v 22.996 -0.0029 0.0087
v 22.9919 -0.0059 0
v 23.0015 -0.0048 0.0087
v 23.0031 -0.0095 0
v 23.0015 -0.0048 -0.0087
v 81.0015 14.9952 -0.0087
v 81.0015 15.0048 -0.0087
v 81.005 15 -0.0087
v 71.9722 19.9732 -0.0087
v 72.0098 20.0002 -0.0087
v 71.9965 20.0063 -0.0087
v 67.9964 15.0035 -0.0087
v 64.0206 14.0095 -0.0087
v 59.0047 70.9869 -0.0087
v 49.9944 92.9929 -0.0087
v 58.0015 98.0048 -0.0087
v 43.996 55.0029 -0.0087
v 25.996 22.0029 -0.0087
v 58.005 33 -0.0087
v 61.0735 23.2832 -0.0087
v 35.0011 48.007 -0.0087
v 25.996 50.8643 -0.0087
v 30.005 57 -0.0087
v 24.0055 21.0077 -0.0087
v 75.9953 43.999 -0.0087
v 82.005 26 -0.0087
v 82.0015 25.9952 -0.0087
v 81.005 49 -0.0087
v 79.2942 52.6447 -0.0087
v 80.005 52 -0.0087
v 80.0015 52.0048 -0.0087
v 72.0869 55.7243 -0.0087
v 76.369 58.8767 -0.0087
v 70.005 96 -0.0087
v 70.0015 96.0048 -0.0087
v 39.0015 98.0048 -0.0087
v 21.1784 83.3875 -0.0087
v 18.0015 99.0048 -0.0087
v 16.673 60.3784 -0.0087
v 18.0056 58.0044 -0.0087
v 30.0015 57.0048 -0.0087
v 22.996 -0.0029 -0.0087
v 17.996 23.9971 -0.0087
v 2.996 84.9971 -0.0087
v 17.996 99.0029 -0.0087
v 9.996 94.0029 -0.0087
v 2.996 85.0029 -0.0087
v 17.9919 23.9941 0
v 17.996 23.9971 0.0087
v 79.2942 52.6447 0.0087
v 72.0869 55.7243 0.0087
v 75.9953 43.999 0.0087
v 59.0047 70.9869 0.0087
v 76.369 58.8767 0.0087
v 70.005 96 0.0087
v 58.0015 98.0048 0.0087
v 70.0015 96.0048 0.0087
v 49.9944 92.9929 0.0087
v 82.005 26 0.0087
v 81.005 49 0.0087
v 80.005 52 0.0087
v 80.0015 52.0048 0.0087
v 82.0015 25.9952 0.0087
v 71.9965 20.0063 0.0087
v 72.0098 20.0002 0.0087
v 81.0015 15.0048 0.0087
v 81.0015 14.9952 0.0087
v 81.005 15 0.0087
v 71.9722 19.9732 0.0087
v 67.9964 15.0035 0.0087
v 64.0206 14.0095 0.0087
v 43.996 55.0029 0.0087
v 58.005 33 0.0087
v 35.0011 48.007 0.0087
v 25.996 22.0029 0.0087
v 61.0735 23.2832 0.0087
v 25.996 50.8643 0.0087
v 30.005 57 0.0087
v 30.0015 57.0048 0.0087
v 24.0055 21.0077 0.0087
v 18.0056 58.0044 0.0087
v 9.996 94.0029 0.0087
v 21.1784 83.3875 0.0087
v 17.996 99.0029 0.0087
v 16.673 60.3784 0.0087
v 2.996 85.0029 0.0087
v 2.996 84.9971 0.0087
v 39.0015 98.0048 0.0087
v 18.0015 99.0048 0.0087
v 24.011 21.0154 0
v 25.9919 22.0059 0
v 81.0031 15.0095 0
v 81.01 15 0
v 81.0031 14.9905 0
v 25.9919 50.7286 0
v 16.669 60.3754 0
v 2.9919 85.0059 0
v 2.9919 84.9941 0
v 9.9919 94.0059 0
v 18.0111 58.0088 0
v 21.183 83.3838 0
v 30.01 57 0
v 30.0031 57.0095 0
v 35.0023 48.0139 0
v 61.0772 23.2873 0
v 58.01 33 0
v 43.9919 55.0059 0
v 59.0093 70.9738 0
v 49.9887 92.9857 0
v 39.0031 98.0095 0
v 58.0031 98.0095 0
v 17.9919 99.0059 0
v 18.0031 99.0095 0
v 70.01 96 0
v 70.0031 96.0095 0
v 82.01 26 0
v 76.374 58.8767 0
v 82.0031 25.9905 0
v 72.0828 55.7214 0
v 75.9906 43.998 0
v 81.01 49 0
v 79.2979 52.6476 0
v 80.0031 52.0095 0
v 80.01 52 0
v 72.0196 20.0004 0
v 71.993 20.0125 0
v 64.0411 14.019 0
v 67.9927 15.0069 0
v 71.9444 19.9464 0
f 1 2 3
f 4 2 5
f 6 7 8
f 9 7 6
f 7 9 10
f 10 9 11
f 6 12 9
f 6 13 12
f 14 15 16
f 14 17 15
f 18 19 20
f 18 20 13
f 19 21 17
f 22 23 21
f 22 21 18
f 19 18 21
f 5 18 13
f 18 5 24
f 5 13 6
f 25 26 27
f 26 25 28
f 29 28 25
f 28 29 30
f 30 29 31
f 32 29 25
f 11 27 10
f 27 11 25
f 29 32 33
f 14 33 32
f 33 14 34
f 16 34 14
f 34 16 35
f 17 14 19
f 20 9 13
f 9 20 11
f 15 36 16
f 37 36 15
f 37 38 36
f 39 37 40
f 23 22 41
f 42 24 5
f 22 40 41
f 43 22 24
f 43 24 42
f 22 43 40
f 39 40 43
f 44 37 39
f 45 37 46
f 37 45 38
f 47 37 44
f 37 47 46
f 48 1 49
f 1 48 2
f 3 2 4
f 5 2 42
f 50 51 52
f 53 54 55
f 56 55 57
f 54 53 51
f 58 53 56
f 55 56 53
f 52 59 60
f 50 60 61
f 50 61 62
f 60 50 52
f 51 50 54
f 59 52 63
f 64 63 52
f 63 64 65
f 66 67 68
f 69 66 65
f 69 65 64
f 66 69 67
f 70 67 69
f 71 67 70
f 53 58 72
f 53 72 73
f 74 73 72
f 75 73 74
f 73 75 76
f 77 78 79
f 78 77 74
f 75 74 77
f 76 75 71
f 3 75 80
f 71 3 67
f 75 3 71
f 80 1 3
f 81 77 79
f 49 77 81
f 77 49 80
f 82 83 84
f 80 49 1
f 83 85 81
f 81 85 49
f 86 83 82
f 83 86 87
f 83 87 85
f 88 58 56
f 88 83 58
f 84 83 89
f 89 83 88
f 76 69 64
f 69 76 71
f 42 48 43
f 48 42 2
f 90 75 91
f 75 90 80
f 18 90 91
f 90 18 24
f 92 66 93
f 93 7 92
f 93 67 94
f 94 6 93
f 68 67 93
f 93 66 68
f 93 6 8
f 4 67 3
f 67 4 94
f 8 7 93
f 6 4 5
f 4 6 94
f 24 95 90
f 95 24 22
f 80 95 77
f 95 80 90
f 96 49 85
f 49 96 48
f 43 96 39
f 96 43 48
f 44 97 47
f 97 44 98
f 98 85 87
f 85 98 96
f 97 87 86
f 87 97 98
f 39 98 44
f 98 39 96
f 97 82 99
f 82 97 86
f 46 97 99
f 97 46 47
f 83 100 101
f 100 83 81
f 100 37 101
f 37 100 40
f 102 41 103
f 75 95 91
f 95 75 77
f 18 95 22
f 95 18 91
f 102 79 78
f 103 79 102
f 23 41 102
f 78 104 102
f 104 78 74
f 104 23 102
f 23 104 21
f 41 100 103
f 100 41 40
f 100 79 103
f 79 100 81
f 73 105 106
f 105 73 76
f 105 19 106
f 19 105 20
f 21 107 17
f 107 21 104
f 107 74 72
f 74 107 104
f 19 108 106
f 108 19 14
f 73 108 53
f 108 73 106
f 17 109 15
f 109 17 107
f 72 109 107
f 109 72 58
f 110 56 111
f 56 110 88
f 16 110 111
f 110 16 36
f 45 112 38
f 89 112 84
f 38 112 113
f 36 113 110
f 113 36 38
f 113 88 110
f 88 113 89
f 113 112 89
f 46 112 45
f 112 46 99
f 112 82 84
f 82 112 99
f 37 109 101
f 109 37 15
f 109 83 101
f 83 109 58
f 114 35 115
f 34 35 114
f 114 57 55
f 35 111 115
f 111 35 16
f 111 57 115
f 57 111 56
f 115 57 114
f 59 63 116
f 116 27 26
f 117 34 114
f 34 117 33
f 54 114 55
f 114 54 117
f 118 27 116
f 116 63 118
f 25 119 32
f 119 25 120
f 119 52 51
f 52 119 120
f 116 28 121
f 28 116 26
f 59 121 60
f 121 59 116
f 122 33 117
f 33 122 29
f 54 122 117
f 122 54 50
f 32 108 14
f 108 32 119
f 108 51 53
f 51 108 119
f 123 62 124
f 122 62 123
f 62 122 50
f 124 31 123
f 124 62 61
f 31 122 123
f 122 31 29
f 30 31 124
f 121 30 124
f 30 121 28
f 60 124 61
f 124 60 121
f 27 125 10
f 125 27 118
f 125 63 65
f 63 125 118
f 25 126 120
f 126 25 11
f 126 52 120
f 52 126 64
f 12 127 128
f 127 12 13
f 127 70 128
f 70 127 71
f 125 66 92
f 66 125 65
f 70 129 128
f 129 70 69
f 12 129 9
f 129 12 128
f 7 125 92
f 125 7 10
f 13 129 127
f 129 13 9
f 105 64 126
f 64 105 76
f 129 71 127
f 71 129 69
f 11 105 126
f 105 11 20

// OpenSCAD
color([0.5839405385485582,0.4048698908705002,0.6877557316706271]) hull(){
    translate([23,0]) sphere(0.01);
    translate([18,24]) sphere(0.01);
    translate([24,21]) sphere(0.01);
}
color([0.29310936231965135,0.08456113000314536,0.6409271470126323]) hull(){
    translate([23,0]) sphere(0.01);
    translate([24,21]) sphere(0.01);
    translate([26,22]) sphere(0.01);
}
color([0.38512246522478266,0.6162859510128613,0.407224705538046]) hull(){
    translate([23,0]) sphere(0.01);
    translate([26,22]) sphere(0.01);
    translate([42,29]) sphere(0.01);
}
color([0.6107800780239486,0.9541913078580654,0.09369719926319908]) hull(){
    translate([23,0]) sphere(0.01);
    translate([42,29]) sphere(0.01);
    translate([64,14]) sphere(0.01);
}
color([0.4396226851829427,0.9817497074141792,0.30111933510979894]) hull(){
    translate([23,0]) sphere(0.01);
    translate([64,14]) sphere(0.01);
    translate([81,15]) sphere(0.01);
}
color([0.08571041628526821,0.691130580335744,0.16573157374072334]) hull(){
    translate([18,24]) sphere(0.01);
    translate([18,58]) sphere(0.01);
    translate([24,21]) sphere(0.01);
}
color([0.4668304924867862,0.30100213617539295,0.3511677492745029]) hull(){
    translate([18,58]) sphere(0.01);
    translate([26,51]) sphere(0.01);
    translate([24,21]) sphere(0.01);
}
color([0.05564944269037686,0.7696481469448815,0.686275624239137]) hull(){
    translate([18,58]) sphere(0.01);
    translate([18,24]) sphere(0.01);
    translate([16,79]) sphere(0.01);
}
color([0.15447252119296884,0.35335085758162643,0.18799175914388588]) hull(){
    translate([18,58]) sphere(0.01);
    translate([16,79]) sphere(0.01);
    translate([6,84]) sphere(0.01);
}
color([0.41322879780265653,0.82270842281296,0.9057146612667819]) hull(){
    translate([18,58]) sphere(0.01);
    translate([6,84]) sphere(0.01);
    translate([3,85]) sphere(0.01);
}
color([0.9688547633127277,0.5528378273263655,0.12760284187612392]) hull(){
    translate([18,58]) sphere(0.01);
    translate([3,85]) sphere(0.01);
    translate([10,94]) sphere(0.01);
}
color([0.1710979555253146,0.7131998843266452,0.6397779425125977]) hull(){
    translate([18,58]) sphere(0.01);
    translate([10,94]) sphere(0.01);
    translate([22,90]) sphere(0.01);
}
color([0.57496968906483,0.8489371230716904,0.07944838941339594]) hull(){
    translate([18,58]) sphere(0.01);
    translate([22,90]) sphere(0.01);
    translate([20,83]) sphere(0.01);
}
color([0.040333123224873146,0.9305910632054132,0.3080440975445232]) hull(){
    translate([18,58]) sphere(0.01);
    translate([20,83]) sphere(0.01);
    translate([16,79]) sphere(0.01);
}
color([0.6084655882345898,0.4923441190446234,0.7069385087242315]) hull(){
    translate([26,22]) sphere(0.01);
    translate([26,51]) sphere(0.01);
    translate([30,57]) sphere(0.01);
}
color([0.6803385961846494,0.18024793645131376,0.10787678186317007]) hull(){
    translate([26,22]) sphere(0.01);
    translate([30,57]) sphere(0.01);
    translate([35,48]) sphere(0.01);
}
color([0.1335624130282893,0.47731112778056706,0.8393950916733898]) hull(){
    translate([26,22]) sphere(0.01);
    translate([35,48]) sphere(0.01);
    translate([42,29]) sphere(0.01);
}
color([0.6780893207968227,0.08337096158279222,0.27725115680544954]) hull(){
    translate([26,51]) sphere(0.01);
    translate([18,58]) sphere(0.01);
    translate([30,57]) sphere(0.01);
}
color([0.9965791662073833,0.03375154870506614,0.10494976972159242]) hull(){
    translate([42,29]) sphere(0.01);
    translate([35,48]) sphere(0.01);
    translate([44,47]) sphere(0.01);
}
color([0.516844917539197,0.1360610465034362,0.543805910213663]) hull(){
    translate([42,29]) sphere(0.01);
    translate([44,47]) sphere(0.01);
    translate([58,33]) sphere(0.01);
}
color([0.04901628196141694,0.4867102513994055,0.8813892002857401]) hull(){
    translate([42,29]) sphere(0.01);
    translate([58,33]) sphere(0.01);
    translate([64,14]) sphere(0.01);
}
color([0.3053751014353143,0.40772022041766365,0.31297204198076634]) hull(){
    translate([44,47]) sphere(0.01);
    translate([44,55]) sphere(0.01);
    translate([35,48]) sphere(0.01);
}
color([0.49907796034366436,0.6160709555012981,0.9916538905911245]) hull(){
    translate([44,47]) sphere(0.01);
    translate([44,55]) sphere(0.01);
    translate([58,33]) sphere(0.01);
}
color([0.3123575451593331,0.46364206475662195,0.8862899719975306]) hull(){
    translate([44,55]) sphere(0.01);
    translate([59,71]) sphere(0.01);
    translate([58,33]) sphere(0.01);
}
color([0.5738800220993816,0.8494037217359881,0.24323676398212035]) hull(){
    translate([44,55]) sphere(0.01);
    translate([50,93]) sphere(0.01);
    translate([59,71]) sphere(0.01);
}
color([0.8402878098664139,0.9530478541805099,0.16594803365564914]) hull(){
    translate([44,55]) sphere(0.01);
    translate([50,93]) sphere(0.01);
    translate([44,47]) sphere(0.01);
}
color([0.0023370868964924796,0.7387895340607371,0.5374530602666081]) hull(){
    translate([50,93]) sphere(0.01);
    translate([58,98]) sphere(0.01);
    translate([59,71]) sphere(0.01);
}
color([0.25604025835089217,0.4320068924153808,0.5112453323210508]) hull(){
    translate([50,93]) sphere(0.01);
    translate([39,98]) sphere(0.01);
    translate([58,98]) sphere(0.01);
}
color([0.7462272619347637,0.5039790716190428,0.8850839351693509]) hull(){
    translate([50,93]) sphere(0.01);
    translate([18,99]) sphere(0.01);
    translate([39,98]) sphere(0.01);
}
color([0.6652757233710683,0.22263754843686523,0.08942086350367451]) hull(){
    translate([50,93]) sphere(0.01);
    translate([10,94]) sphere(0.01);
    translate([18,99]) sphere(0.01);
}
color([0.6195232841458308,0.9036720387350747,0.7222923954673625]) hull(){
    translate([50,93]) sphere(0.01);
    translate([22,90]) sphere(0.01);
    translate([10,94]) sphere(0.01);
}
color([0.6665075097113882,0.5421139713900744,0.6943978877819516]) hull(){
    translate([50,93]) sphere(0.01);
    translate([20,83]) sphere(0.01);
    translate([22,90]) sphere(0.01);
}
color([0.9269770591996176,0.12480324665016229,0.8422397758241813]) hull(){
    translate([20,83]) sphere(0.01);
    translate([16,79]) sphere(0.01);
    translate([18,58]) sphere(0.01);
}
color([0.028249143050612435,0.8554899328562455,0.6212809598996976]) hull(){
    translate([58,98]) sphere(0.01);
    translate([59,71]) sphere(0.01);
    translate([70,96]) sphere(0.01);
}
color([0.6435486749275994,0.4857227915978113,0.2898251547629681]) hull(){
    translate([58,98]) sphere(0.01);
    translate([70,96]) sphere(0.01);
    translate([82,26]) sphere(0.01);
}
color([0.21709076393122206,0.4979948584580751,0.6176241526046676]) hull(){
    translate([58,98]) sphere(0.01);
    translate([82,26]) sphere(0.01);
    translate([81,49]) sphere(0.01);
}
color([0.4722249532281336,0.7228331534363125,0.6109414561657331]) hull(){
    translate([58,98]) sphere(0.01);
    translate([81,49]) sphere(0.01);
    translate([59,71]) sphere(0.01);
}
color([0.5330085163671737,0.6769359871291822,0.5973748769978083]) hull(){
    translate([59,71]) sphere(0.01);
    translate([81,49]) sphere(0.01);
    translate([77,50]) sphere(0.01);
}
color([0.14460255854654236,0.21273280877313017,0.8417179364881341]) hull(){
    translate([59,71]) sphere(0.01);
    translate([77,50]) sphere(0.01);
    translate([80,52]) sphere(0.01);
}
color([0.6300391880279899,0.5103677782275869,0.4479627161837708]) hull(){
    translate([59,71]) sphere(0.01);
    translate([80,52]) sphere(0.01);
    translate([81,49]) sphere(0.01);
}
color([0.2903518628620462,0.1744676713524972,0.5457372127765215]) hull(){
    translate([81,49]) sphere(0.01);
    translate([82,26]) sphere(0.01);
    translate([72,20]) sphere(0.01);
}
color([0.6340658375422632,0.7004271366493812,0.690956934786038]) hull(){
    translate([81,49]) sphere(0.01);
    translate([72,20]) sphere(0.01);
    translate([77,50]) sphere(0.01);
}
color([0.013948469234104865,0.8018456354370093,0.2607079205191076]) hull(){
    translate([77,50]) sphere(0.01);
    translate([72,20]) sphere(0.01);
    translate([80,52]) sphere(0.01);
}
color([0.01899716010339858,0.7507132946374245,0.44168653561511173]) hull(){
    translate([64,14]) sphere(0.01);
    translate([68,15]) sphere(0.01);
    translate([81,15]) sphere(0.01);
}
color([0.1668653701245908,0.45955837321901094,0.7876756969907556]) hull(){
    translate([68,15]) sphere(0.01);
    translate([72,20]) sphere(0.01);
    translate([81,15]) sphere(0.01);
}
color([0.09564527702692727,0.06733136152719421,0.7816649665975636]) hull(){
    translate([64,14]) sphere(0.01);
    translate([72,20]) sphere(0.01);
    translate([42,29]) sphere(0.01);
}
